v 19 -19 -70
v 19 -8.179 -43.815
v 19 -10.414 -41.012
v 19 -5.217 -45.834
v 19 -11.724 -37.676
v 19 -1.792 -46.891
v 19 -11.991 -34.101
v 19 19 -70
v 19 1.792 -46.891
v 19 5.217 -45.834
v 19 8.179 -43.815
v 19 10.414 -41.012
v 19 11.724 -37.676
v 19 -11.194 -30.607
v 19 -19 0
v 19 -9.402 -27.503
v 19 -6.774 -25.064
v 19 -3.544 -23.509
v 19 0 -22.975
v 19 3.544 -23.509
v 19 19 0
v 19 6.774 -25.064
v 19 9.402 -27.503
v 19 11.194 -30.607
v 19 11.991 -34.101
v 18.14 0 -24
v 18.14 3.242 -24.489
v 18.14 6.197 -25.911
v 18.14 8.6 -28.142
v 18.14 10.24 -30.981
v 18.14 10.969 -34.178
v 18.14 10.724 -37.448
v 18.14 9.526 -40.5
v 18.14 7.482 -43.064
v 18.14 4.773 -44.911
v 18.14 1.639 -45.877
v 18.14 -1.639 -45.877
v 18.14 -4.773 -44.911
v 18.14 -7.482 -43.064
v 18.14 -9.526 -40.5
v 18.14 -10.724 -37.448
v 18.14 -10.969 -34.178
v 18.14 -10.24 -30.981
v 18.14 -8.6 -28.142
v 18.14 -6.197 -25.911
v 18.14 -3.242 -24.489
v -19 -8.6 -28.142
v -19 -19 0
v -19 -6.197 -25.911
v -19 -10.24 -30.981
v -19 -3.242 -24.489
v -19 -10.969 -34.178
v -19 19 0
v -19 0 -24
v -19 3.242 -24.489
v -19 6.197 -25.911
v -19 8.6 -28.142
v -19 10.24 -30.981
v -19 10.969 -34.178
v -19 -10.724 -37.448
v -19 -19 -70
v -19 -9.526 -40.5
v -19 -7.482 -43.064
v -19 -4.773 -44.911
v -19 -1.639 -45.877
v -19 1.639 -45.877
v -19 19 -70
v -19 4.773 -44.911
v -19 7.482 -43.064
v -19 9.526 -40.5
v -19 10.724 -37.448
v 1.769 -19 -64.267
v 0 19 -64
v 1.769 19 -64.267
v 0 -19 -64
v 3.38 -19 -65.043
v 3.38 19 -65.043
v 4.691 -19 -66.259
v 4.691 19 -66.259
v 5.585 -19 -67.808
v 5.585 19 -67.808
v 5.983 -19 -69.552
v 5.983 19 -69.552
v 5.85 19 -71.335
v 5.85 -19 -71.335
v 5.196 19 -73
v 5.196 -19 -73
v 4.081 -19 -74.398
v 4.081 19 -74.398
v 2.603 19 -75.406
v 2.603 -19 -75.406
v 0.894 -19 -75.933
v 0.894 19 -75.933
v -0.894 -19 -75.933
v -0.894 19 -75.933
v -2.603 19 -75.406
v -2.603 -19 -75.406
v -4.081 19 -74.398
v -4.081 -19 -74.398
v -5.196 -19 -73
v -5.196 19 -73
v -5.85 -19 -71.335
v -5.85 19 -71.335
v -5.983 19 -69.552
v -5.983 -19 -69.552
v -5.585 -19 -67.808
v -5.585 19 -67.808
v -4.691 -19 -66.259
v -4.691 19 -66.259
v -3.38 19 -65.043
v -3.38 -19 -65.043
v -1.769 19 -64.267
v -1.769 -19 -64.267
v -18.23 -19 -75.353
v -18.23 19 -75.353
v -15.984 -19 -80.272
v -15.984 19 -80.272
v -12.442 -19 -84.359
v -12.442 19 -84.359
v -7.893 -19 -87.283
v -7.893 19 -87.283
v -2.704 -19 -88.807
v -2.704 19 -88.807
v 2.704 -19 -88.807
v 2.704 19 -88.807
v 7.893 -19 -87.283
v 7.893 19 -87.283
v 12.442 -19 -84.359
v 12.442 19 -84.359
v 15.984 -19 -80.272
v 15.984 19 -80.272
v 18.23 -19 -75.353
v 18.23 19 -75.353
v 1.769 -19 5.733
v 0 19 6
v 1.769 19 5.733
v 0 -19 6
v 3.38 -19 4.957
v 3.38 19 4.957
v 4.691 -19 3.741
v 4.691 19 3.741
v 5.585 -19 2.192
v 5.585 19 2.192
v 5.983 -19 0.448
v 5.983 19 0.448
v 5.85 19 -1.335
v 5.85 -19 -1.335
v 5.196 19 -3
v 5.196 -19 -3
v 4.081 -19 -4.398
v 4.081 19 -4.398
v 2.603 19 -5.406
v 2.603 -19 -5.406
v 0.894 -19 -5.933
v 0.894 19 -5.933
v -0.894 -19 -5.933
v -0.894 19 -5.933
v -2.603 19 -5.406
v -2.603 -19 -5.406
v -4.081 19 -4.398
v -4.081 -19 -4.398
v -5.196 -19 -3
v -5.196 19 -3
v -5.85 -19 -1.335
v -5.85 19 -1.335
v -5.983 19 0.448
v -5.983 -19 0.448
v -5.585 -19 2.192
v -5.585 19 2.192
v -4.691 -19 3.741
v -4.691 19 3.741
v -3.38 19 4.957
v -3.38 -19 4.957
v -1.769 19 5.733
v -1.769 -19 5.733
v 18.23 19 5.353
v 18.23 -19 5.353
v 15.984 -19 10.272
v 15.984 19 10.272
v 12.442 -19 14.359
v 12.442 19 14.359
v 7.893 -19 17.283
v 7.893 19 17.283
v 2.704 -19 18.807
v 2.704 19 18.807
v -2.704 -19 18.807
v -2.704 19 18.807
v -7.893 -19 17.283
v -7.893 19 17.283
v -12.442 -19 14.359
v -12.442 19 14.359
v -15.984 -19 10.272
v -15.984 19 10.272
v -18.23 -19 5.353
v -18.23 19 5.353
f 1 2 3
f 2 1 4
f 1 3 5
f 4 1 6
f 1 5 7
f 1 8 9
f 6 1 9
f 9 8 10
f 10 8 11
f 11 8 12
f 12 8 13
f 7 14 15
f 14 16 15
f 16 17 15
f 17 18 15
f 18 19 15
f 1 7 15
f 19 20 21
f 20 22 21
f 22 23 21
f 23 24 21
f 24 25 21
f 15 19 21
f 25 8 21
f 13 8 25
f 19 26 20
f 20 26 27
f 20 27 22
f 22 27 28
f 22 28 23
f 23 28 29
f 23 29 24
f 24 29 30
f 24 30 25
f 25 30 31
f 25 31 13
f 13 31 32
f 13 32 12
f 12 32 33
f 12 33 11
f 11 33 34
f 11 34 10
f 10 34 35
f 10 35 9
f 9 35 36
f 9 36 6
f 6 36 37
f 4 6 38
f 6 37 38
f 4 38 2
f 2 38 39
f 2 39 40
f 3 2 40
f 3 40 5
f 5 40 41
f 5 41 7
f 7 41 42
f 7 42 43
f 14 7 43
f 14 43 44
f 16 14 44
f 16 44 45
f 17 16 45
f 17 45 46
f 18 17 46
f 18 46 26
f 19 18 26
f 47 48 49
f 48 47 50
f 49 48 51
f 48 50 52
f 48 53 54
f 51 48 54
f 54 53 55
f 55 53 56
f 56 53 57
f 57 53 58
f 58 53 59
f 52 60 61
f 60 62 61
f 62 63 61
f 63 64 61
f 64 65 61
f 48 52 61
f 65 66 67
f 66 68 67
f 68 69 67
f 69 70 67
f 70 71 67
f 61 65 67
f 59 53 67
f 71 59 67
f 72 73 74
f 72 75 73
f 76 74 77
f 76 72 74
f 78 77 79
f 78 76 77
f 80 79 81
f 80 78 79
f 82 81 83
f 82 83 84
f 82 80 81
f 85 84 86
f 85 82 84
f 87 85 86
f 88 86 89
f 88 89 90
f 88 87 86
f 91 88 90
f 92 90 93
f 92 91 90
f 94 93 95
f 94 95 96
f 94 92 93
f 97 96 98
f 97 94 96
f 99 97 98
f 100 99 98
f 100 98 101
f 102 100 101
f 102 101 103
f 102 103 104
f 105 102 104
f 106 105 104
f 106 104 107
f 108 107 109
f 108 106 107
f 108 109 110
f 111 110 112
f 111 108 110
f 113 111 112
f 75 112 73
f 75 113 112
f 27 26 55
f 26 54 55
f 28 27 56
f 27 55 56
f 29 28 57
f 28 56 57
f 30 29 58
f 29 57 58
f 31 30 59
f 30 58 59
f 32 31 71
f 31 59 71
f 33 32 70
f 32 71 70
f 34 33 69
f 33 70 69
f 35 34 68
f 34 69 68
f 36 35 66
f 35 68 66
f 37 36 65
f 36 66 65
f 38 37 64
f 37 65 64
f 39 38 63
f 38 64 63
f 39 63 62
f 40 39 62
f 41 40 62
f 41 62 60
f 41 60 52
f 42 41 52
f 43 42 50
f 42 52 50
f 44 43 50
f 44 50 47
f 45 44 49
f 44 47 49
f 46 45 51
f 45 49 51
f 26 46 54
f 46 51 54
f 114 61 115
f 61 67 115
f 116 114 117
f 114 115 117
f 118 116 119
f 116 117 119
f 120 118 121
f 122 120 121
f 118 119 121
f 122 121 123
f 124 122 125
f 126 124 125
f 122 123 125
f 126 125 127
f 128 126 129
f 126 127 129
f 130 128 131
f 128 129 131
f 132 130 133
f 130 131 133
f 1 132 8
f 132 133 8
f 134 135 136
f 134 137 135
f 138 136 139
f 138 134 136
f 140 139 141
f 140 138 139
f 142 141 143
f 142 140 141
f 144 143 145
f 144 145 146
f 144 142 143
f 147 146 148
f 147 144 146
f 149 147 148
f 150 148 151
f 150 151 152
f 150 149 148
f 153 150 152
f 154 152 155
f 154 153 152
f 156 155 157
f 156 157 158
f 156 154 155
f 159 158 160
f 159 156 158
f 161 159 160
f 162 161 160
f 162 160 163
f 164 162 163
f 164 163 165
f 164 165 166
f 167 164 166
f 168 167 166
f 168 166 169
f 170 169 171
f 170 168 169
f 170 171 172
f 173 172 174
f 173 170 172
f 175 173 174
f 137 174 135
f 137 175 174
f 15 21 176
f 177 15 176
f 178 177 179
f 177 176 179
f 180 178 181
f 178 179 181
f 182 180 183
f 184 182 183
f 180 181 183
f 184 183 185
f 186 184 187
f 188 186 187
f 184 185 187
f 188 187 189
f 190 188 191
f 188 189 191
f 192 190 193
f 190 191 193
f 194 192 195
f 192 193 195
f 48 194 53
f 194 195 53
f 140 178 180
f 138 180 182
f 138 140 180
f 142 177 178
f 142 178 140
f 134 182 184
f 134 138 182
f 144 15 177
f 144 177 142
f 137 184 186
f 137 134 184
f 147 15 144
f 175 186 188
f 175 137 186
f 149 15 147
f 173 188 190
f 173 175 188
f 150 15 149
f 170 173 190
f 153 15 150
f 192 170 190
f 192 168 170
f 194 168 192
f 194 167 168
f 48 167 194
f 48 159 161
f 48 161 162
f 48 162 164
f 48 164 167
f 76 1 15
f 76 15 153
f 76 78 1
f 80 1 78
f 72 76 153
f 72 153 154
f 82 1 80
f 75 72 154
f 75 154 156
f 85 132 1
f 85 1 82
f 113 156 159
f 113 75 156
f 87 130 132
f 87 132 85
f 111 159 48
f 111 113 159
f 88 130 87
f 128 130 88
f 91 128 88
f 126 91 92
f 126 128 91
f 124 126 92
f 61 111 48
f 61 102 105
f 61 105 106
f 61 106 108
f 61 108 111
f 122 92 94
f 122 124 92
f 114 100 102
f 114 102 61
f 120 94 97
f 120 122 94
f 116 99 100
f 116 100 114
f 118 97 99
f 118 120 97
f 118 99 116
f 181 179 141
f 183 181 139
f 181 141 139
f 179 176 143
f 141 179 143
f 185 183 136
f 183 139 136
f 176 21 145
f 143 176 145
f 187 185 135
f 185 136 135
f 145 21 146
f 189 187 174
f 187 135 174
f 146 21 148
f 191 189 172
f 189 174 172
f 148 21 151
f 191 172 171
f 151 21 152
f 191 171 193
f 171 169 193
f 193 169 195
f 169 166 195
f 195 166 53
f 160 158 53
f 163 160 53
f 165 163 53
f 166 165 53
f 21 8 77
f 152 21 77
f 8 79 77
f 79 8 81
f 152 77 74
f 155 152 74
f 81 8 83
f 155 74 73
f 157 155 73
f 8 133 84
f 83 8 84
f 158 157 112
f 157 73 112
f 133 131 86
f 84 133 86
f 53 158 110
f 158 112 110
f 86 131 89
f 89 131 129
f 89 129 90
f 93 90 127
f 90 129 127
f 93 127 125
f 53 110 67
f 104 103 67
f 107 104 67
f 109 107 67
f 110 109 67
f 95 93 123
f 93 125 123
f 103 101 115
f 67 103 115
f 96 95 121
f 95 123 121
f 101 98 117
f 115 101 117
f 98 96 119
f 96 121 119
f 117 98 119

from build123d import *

# Parameters (mm, degrees)
SKETCH1_R                        = 6
BOSS_EXTRUDE1_DEPTH              = 19
M24X2_0_TAPPED_HOLE1_D           = 22
M24X2_0_TAPPED_HOLE1_DEPTH       = 38
M24X2_0_TAPPED_HOLE1_CSINK_D     = 24.05
M24X2_0_TAPPED_HOLE1_CSINK_ANGLE = 100
M24X2_0_TAPPED_HOLE1_TIP         = 6.609466809


with BuildPart() as part:
    # Sketch1 → Boss-Extrude1 (new, symmetric)
    with BuildSketch(Plane(origin=(0, 0, 0), x_dir=(1, 0, 0), z_dir=(0, 1, 0))):
        with BuildLine():
            Line((-19, 0), (-19, 70))
            ThreePointArc((-19, 70), (0, 89), (19, 70))
            Line((19, 70), (19, 0))
            ThreePointArc((19, 0), (0, -19), (-19, 0))
        make_face()
        with Locations(Location((0, 70, 0), (0, 0, 270))):
            Circle(SKETCH1_R, mode=Mode.SUBTRACT)
        with Locations(Location((0, 0, 0), (0, 0, 270))):
            Circle(SKETCH1_R, mode=Mode.SUBTRACT)
    extrude(amount=BOSS_EXTRUDE1_DEPTH, both=True)

    # M24x2.0 Tapped Hole1
    with Locations(Plane(origin=(19, 0, 0), x_dir=(0, 0, -1), z_dir=(1, 0, 0))):
        with Locations((35, 0)):
            CounterSinkHole(M24X2_0_TAPPED_HOLE1_D / 2, M24X2_0_TAPPED_HOLE1_CSINK_D / 2, depth=M24X2_0_TAPPED_HOLE1_DEPTH, counter_sink_angle=M24X2_0_TAPPED_HOLE1_CSINK_ANGLE)
            with Locations((0, 0, -(M24X2_0_TAPPED_HOLE1_DEPTH + M24X2_0_TAPPED_HOLE1_TIP / 2))):  # 118° drill point
                Cone(0, M24X2_0_TAPPED_HOLE1_D / 2, M24X2_0_TAPPED_HOLE1_TIP, mode=Mode.SUBTRACT)


solid = part.part
